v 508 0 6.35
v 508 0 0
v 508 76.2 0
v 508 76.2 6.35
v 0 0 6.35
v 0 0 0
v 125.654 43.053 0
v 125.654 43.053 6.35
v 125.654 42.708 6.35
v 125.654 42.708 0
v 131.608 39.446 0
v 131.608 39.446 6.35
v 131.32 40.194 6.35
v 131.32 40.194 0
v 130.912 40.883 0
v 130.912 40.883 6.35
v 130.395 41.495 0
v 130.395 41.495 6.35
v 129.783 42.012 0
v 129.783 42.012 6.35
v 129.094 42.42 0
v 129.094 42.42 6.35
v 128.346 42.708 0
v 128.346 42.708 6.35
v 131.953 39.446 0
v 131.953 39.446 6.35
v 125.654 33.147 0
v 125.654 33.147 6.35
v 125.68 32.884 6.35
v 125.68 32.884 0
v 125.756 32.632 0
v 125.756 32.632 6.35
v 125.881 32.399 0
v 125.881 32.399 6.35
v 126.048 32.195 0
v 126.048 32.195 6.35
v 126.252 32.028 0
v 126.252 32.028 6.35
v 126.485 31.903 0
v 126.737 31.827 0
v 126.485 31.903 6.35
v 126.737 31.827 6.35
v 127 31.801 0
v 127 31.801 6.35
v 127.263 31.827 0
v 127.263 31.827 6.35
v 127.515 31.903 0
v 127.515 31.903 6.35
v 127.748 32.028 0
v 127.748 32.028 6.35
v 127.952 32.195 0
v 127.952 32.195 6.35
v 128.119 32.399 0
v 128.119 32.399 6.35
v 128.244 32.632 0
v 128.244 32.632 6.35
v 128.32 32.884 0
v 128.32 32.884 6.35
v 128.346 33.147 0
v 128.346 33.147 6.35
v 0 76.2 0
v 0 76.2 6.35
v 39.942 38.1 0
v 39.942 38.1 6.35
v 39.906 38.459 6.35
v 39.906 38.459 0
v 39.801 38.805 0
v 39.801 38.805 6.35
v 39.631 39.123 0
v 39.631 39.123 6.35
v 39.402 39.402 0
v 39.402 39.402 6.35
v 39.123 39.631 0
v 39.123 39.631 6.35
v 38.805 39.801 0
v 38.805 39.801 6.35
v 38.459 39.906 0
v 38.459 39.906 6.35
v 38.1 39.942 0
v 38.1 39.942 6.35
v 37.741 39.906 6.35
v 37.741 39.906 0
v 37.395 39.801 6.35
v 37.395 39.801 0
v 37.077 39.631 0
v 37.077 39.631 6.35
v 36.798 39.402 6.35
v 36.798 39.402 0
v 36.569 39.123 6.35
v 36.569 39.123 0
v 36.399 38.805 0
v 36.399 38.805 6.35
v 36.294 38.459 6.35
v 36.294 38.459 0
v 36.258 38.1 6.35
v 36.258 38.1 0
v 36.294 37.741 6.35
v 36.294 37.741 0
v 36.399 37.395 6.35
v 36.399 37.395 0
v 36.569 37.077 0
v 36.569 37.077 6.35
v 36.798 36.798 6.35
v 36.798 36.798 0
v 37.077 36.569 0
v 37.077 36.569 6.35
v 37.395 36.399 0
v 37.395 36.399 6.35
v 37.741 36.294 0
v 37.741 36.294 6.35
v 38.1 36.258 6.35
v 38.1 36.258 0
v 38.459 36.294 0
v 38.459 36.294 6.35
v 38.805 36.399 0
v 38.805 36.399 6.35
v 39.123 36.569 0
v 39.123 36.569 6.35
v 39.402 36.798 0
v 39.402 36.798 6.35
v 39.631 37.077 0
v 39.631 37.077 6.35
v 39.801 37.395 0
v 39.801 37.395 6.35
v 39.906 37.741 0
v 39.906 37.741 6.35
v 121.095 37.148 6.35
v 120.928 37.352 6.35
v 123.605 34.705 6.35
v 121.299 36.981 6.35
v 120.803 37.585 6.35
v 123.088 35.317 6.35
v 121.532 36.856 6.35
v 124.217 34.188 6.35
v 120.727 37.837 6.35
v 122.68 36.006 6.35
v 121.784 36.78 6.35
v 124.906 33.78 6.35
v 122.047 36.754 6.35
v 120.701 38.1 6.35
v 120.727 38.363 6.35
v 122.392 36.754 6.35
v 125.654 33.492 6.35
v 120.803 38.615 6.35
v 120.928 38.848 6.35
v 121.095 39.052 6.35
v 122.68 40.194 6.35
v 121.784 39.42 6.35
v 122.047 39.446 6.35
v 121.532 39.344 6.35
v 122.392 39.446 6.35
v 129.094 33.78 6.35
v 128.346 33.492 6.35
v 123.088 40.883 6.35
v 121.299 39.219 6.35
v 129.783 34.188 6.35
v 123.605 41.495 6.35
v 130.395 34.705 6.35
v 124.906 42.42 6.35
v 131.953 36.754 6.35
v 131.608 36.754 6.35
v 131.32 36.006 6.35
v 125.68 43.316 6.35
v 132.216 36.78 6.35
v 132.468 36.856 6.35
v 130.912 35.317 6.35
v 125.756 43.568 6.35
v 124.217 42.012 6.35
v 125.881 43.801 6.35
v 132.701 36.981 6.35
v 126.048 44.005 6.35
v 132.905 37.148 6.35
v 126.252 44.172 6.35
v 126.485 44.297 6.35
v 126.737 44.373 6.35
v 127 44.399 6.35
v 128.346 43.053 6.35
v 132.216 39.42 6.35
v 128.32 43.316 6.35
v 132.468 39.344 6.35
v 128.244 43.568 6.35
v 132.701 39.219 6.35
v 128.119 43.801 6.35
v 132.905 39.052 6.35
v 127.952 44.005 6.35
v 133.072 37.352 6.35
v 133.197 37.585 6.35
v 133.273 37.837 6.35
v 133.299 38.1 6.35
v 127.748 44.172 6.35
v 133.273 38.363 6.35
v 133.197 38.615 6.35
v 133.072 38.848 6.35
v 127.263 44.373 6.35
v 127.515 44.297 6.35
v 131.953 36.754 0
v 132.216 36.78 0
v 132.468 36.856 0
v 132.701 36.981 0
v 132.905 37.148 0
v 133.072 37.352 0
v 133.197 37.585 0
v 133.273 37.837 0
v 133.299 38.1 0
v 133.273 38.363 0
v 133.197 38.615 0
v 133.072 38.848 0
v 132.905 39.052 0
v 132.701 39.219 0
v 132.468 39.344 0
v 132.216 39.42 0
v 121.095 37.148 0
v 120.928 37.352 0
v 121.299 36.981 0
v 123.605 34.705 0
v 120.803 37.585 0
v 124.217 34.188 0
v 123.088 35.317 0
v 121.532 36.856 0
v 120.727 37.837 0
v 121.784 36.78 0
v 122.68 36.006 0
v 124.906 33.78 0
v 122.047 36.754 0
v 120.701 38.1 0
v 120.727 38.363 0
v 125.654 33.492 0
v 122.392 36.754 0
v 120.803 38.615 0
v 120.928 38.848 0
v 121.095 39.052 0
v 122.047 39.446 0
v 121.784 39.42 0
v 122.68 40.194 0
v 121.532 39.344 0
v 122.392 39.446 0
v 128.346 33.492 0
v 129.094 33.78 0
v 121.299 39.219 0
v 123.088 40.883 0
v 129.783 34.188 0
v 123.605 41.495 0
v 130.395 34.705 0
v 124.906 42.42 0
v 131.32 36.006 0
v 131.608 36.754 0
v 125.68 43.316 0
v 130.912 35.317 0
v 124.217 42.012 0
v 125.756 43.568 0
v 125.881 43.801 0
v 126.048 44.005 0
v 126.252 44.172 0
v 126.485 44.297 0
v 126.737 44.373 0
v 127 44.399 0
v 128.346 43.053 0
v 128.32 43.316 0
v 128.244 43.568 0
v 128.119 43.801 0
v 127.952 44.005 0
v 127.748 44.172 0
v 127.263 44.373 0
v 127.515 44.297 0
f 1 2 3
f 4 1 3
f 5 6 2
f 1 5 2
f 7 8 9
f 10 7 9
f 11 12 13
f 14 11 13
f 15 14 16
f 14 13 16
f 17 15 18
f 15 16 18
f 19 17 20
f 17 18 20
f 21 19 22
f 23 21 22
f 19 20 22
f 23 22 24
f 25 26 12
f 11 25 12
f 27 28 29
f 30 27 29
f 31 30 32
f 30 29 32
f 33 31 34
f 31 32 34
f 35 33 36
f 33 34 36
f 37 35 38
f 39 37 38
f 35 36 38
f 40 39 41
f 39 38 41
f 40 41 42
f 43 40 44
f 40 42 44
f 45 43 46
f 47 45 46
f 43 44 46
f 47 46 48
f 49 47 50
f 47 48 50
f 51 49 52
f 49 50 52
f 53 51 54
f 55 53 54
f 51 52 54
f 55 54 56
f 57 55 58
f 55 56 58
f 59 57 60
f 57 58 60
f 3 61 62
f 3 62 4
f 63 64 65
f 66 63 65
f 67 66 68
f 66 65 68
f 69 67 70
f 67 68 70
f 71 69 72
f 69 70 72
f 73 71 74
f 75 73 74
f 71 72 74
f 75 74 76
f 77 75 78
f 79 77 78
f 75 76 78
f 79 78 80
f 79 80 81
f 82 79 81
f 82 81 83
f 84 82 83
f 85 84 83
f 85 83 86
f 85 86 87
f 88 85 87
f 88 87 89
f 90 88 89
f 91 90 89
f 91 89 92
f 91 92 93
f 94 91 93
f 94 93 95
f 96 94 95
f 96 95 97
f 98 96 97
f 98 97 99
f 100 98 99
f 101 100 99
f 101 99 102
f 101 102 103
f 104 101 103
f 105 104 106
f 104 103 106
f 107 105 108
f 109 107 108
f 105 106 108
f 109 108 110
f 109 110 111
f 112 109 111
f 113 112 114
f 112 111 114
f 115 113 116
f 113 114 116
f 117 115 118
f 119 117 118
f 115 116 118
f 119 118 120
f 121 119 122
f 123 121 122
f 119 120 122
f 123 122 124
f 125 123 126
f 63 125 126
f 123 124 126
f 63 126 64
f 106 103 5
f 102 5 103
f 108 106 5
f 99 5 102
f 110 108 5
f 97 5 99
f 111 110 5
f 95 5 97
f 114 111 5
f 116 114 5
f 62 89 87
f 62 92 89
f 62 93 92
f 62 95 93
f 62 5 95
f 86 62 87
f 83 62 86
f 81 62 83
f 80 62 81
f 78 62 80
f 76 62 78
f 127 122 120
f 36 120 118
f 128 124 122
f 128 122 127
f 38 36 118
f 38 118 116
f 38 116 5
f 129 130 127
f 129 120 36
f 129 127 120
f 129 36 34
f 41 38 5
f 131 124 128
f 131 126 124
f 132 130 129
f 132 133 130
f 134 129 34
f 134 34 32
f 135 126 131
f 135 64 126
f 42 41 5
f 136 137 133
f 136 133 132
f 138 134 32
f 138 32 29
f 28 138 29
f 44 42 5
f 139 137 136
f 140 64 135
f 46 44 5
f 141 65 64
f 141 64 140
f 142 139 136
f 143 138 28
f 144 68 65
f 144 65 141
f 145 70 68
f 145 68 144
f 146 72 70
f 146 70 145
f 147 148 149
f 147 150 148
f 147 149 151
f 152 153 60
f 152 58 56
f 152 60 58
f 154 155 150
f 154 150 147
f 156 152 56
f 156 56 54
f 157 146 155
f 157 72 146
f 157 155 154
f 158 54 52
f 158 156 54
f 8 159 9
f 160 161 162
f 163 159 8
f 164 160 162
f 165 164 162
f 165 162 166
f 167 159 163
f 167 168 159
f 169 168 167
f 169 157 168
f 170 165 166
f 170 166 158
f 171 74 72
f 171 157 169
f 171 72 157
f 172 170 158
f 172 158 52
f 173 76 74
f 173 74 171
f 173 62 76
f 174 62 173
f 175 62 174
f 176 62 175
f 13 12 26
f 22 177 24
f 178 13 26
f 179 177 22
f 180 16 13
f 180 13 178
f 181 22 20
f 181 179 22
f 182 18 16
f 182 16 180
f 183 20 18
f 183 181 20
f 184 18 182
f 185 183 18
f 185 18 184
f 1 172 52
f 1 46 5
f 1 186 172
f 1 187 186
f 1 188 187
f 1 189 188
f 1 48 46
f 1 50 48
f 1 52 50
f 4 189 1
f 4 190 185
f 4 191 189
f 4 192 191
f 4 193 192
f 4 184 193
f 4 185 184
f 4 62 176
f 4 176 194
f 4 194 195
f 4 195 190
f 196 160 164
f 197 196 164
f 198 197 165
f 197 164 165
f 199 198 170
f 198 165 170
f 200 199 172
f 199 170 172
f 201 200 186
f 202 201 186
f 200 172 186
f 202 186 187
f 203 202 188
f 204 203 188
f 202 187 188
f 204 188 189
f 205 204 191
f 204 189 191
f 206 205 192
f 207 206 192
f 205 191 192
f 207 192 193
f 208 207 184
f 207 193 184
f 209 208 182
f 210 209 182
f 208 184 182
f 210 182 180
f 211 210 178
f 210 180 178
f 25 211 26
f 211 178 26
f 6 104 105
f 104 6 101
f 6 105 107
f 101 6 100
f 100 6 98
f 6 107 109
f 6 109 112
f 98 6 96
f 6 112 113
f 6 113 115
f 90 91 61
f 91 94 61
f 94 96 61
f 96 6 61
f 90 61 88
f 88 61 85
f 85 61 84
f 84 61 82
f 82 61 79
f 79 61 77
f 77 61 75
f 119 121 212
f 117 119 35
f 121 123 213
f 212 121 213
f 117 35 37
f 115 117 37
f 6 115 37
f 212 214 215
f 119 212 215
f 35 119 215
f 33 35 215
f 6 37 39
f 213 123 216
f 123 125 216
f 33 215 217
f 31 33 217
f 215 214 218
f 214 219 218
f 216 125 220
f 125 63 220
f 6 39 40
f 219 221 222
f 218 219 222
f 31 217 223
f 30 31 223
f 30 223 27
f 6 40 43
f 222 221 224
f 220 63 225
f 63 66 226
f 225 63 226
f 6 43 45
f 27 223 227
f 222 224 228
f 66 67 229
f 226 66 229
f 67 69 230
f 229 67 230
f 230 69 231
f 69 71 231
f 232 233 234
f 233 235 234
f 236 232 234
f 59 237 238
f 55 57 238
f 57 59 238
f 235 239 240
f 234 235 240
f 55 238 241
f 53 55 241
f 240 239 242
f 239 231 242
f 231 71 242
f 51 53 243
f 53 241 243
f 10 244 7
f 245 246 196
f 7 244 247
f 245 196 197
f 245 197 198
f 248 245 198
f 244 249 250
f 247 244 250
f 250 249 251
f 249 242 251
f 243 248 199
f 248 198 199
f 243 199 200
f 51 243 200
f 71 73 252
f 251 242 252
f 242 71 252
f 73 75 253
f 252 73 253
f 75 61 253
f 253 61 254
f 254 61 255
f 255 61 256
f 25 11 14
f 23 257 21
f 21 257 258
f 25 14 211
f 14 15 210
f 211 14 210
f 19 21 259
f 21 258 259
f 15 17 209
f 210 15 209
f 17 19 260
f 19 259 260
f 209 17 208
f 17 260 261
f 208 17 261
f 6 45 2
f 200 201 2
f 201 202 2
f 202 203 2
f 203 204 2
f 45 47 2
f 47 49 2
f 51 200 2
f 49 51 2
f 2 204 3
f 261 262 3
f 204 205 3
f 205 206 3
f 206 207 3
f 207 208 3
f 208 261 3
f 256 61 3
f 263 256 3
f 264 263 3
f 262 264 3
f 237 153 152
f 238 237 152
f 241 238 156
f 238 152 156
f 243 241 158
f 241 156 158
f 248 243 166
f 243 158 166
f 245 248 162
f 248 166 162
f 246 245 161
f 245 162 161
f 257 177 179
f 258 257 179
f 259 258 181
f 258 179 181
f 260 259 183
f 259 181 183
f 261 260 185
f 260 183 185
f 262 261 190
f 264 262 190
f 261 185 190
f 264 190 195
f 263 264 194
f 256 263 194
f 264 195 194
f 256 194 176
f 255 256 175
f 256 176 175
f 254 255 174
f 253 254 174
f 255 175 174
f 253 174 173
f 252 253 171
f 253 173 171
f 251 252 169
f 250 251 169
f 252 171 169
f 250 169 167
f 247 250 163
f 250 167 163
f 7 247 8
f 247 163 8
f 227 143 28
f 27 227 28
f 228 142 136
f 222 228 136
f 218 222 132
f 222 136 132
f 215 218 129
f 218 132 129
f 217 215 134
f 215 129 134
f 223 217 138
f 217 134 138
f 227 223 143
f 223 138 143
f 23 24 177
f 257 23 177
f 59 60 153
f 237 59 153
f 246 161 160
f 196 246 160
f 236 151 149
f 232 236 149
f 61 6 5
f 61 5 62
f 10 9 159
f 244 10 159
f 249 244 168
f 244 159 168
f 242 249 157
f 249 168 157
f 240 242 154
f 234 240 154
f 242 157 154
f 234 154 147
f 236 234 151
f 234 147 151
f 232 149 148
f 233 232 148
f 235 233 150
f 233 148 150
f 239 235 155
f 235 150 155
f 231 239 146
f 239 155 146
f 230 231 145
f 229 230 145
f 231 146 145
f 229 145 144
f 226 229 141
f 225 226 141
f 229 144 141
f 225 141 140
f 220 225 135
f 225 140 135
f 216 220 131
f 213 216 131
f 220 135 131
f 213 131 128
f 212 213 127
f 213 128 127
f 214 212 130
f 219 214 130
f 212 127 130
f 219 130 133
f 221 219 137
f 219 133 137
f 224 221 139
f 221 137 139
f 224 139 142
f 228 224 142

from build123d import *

# Parameters (mm, degrees)
SKETCH1_W           = 508
SKETCH1_H           = 76.2
BOSS_EXTRUDE1_DEPTH = 6.35
CUT_EXTRUDE3_DEPTH  = 7.35
SKETCH3_R           = 1.8415
CUT_EXTRUDE4_DEPTH  = 7.35


with BuildPart() as part:
    # Sketch1 → Boss-Extrude1 (new body)
    with BuildSketch(Plane.XY):
        with Locations((254, 38.1)):
            Rectangle(SKETCH1_W, SKETCH1_H)
    extrude(amount=BOSS_EXTRUDE1_DEPTH)

    # Sketch2 → Cut-Extrude3 (cut, through all)
    with BuildSketch(Plane.XY.offset(6.35)):
        with BuildLine():
            ThreePointArc((128.3462, 43.053), (127, 44.3992), (125.6538, 43.053))
            Line((125.6538, 43.053), (125.6538, 42.707982847))
            ThreePointArc((125.6538, 42.707982847), (123.605463186, 41.494536814), (122.392017153, 39.4462))
            Line((122.392017153, 39.4462), (122.047, 39.4462))
            ThreePointArc((122.047, 39.4462), (120.7008, 38.1), (122.047, 36.7538))
            Line((122.047, 36.7538), (122.392017153, 36.7538))
            ThreePointArc((122.392017153, 36.7538), (123.605463186, 34.705463186), (125.6538, 33.492017153))
            Line((125.6538, 33.492017153), (125.6538, 33.147))
            ThreePointArc((125.6538, 33.147), (127, 31.8008), (128.3462, 33.147))
            Line((128.3462, 33.147), (128.3462, 33.492017153))
            ThreePointArc((128.3462, 33.492017153), (130.394536814, 34.705463186), (131.607982847, 36.7538))
            Line((131.607982847, 36.7538), (131.953, 36.7538))
            ThreePointArc((131.953, 36.7538), (133.2992, 38.1), (131.953, 39.4462))
            Line((131.953, 39.4462), (131.607982847, 39.4462))
            ThreePointArc((131.607982847, 39.4462), (130.394536814, 41.494536814), (128.3462, 42.707982847))
            Line((128.3462, 42.707982847), (128.3462, 43.053))
        make_face()
    extrude(amount=-CUT_EXTRUDE3_DEPTH, mode=Mode.SUBTRACT)

    # Sketch3 → Cut-Extrude4 (cut, through all)
    with BuildSketch(Plane.XY.offset(6.35)):
        with Locations((38.1, 38.1)):
            Circle(SKETCH3_R)
    extrude(amount=-CUT_EXTRUDE4_DEPTH, mode=Mode.SUBTRACT)


solid = part.part
